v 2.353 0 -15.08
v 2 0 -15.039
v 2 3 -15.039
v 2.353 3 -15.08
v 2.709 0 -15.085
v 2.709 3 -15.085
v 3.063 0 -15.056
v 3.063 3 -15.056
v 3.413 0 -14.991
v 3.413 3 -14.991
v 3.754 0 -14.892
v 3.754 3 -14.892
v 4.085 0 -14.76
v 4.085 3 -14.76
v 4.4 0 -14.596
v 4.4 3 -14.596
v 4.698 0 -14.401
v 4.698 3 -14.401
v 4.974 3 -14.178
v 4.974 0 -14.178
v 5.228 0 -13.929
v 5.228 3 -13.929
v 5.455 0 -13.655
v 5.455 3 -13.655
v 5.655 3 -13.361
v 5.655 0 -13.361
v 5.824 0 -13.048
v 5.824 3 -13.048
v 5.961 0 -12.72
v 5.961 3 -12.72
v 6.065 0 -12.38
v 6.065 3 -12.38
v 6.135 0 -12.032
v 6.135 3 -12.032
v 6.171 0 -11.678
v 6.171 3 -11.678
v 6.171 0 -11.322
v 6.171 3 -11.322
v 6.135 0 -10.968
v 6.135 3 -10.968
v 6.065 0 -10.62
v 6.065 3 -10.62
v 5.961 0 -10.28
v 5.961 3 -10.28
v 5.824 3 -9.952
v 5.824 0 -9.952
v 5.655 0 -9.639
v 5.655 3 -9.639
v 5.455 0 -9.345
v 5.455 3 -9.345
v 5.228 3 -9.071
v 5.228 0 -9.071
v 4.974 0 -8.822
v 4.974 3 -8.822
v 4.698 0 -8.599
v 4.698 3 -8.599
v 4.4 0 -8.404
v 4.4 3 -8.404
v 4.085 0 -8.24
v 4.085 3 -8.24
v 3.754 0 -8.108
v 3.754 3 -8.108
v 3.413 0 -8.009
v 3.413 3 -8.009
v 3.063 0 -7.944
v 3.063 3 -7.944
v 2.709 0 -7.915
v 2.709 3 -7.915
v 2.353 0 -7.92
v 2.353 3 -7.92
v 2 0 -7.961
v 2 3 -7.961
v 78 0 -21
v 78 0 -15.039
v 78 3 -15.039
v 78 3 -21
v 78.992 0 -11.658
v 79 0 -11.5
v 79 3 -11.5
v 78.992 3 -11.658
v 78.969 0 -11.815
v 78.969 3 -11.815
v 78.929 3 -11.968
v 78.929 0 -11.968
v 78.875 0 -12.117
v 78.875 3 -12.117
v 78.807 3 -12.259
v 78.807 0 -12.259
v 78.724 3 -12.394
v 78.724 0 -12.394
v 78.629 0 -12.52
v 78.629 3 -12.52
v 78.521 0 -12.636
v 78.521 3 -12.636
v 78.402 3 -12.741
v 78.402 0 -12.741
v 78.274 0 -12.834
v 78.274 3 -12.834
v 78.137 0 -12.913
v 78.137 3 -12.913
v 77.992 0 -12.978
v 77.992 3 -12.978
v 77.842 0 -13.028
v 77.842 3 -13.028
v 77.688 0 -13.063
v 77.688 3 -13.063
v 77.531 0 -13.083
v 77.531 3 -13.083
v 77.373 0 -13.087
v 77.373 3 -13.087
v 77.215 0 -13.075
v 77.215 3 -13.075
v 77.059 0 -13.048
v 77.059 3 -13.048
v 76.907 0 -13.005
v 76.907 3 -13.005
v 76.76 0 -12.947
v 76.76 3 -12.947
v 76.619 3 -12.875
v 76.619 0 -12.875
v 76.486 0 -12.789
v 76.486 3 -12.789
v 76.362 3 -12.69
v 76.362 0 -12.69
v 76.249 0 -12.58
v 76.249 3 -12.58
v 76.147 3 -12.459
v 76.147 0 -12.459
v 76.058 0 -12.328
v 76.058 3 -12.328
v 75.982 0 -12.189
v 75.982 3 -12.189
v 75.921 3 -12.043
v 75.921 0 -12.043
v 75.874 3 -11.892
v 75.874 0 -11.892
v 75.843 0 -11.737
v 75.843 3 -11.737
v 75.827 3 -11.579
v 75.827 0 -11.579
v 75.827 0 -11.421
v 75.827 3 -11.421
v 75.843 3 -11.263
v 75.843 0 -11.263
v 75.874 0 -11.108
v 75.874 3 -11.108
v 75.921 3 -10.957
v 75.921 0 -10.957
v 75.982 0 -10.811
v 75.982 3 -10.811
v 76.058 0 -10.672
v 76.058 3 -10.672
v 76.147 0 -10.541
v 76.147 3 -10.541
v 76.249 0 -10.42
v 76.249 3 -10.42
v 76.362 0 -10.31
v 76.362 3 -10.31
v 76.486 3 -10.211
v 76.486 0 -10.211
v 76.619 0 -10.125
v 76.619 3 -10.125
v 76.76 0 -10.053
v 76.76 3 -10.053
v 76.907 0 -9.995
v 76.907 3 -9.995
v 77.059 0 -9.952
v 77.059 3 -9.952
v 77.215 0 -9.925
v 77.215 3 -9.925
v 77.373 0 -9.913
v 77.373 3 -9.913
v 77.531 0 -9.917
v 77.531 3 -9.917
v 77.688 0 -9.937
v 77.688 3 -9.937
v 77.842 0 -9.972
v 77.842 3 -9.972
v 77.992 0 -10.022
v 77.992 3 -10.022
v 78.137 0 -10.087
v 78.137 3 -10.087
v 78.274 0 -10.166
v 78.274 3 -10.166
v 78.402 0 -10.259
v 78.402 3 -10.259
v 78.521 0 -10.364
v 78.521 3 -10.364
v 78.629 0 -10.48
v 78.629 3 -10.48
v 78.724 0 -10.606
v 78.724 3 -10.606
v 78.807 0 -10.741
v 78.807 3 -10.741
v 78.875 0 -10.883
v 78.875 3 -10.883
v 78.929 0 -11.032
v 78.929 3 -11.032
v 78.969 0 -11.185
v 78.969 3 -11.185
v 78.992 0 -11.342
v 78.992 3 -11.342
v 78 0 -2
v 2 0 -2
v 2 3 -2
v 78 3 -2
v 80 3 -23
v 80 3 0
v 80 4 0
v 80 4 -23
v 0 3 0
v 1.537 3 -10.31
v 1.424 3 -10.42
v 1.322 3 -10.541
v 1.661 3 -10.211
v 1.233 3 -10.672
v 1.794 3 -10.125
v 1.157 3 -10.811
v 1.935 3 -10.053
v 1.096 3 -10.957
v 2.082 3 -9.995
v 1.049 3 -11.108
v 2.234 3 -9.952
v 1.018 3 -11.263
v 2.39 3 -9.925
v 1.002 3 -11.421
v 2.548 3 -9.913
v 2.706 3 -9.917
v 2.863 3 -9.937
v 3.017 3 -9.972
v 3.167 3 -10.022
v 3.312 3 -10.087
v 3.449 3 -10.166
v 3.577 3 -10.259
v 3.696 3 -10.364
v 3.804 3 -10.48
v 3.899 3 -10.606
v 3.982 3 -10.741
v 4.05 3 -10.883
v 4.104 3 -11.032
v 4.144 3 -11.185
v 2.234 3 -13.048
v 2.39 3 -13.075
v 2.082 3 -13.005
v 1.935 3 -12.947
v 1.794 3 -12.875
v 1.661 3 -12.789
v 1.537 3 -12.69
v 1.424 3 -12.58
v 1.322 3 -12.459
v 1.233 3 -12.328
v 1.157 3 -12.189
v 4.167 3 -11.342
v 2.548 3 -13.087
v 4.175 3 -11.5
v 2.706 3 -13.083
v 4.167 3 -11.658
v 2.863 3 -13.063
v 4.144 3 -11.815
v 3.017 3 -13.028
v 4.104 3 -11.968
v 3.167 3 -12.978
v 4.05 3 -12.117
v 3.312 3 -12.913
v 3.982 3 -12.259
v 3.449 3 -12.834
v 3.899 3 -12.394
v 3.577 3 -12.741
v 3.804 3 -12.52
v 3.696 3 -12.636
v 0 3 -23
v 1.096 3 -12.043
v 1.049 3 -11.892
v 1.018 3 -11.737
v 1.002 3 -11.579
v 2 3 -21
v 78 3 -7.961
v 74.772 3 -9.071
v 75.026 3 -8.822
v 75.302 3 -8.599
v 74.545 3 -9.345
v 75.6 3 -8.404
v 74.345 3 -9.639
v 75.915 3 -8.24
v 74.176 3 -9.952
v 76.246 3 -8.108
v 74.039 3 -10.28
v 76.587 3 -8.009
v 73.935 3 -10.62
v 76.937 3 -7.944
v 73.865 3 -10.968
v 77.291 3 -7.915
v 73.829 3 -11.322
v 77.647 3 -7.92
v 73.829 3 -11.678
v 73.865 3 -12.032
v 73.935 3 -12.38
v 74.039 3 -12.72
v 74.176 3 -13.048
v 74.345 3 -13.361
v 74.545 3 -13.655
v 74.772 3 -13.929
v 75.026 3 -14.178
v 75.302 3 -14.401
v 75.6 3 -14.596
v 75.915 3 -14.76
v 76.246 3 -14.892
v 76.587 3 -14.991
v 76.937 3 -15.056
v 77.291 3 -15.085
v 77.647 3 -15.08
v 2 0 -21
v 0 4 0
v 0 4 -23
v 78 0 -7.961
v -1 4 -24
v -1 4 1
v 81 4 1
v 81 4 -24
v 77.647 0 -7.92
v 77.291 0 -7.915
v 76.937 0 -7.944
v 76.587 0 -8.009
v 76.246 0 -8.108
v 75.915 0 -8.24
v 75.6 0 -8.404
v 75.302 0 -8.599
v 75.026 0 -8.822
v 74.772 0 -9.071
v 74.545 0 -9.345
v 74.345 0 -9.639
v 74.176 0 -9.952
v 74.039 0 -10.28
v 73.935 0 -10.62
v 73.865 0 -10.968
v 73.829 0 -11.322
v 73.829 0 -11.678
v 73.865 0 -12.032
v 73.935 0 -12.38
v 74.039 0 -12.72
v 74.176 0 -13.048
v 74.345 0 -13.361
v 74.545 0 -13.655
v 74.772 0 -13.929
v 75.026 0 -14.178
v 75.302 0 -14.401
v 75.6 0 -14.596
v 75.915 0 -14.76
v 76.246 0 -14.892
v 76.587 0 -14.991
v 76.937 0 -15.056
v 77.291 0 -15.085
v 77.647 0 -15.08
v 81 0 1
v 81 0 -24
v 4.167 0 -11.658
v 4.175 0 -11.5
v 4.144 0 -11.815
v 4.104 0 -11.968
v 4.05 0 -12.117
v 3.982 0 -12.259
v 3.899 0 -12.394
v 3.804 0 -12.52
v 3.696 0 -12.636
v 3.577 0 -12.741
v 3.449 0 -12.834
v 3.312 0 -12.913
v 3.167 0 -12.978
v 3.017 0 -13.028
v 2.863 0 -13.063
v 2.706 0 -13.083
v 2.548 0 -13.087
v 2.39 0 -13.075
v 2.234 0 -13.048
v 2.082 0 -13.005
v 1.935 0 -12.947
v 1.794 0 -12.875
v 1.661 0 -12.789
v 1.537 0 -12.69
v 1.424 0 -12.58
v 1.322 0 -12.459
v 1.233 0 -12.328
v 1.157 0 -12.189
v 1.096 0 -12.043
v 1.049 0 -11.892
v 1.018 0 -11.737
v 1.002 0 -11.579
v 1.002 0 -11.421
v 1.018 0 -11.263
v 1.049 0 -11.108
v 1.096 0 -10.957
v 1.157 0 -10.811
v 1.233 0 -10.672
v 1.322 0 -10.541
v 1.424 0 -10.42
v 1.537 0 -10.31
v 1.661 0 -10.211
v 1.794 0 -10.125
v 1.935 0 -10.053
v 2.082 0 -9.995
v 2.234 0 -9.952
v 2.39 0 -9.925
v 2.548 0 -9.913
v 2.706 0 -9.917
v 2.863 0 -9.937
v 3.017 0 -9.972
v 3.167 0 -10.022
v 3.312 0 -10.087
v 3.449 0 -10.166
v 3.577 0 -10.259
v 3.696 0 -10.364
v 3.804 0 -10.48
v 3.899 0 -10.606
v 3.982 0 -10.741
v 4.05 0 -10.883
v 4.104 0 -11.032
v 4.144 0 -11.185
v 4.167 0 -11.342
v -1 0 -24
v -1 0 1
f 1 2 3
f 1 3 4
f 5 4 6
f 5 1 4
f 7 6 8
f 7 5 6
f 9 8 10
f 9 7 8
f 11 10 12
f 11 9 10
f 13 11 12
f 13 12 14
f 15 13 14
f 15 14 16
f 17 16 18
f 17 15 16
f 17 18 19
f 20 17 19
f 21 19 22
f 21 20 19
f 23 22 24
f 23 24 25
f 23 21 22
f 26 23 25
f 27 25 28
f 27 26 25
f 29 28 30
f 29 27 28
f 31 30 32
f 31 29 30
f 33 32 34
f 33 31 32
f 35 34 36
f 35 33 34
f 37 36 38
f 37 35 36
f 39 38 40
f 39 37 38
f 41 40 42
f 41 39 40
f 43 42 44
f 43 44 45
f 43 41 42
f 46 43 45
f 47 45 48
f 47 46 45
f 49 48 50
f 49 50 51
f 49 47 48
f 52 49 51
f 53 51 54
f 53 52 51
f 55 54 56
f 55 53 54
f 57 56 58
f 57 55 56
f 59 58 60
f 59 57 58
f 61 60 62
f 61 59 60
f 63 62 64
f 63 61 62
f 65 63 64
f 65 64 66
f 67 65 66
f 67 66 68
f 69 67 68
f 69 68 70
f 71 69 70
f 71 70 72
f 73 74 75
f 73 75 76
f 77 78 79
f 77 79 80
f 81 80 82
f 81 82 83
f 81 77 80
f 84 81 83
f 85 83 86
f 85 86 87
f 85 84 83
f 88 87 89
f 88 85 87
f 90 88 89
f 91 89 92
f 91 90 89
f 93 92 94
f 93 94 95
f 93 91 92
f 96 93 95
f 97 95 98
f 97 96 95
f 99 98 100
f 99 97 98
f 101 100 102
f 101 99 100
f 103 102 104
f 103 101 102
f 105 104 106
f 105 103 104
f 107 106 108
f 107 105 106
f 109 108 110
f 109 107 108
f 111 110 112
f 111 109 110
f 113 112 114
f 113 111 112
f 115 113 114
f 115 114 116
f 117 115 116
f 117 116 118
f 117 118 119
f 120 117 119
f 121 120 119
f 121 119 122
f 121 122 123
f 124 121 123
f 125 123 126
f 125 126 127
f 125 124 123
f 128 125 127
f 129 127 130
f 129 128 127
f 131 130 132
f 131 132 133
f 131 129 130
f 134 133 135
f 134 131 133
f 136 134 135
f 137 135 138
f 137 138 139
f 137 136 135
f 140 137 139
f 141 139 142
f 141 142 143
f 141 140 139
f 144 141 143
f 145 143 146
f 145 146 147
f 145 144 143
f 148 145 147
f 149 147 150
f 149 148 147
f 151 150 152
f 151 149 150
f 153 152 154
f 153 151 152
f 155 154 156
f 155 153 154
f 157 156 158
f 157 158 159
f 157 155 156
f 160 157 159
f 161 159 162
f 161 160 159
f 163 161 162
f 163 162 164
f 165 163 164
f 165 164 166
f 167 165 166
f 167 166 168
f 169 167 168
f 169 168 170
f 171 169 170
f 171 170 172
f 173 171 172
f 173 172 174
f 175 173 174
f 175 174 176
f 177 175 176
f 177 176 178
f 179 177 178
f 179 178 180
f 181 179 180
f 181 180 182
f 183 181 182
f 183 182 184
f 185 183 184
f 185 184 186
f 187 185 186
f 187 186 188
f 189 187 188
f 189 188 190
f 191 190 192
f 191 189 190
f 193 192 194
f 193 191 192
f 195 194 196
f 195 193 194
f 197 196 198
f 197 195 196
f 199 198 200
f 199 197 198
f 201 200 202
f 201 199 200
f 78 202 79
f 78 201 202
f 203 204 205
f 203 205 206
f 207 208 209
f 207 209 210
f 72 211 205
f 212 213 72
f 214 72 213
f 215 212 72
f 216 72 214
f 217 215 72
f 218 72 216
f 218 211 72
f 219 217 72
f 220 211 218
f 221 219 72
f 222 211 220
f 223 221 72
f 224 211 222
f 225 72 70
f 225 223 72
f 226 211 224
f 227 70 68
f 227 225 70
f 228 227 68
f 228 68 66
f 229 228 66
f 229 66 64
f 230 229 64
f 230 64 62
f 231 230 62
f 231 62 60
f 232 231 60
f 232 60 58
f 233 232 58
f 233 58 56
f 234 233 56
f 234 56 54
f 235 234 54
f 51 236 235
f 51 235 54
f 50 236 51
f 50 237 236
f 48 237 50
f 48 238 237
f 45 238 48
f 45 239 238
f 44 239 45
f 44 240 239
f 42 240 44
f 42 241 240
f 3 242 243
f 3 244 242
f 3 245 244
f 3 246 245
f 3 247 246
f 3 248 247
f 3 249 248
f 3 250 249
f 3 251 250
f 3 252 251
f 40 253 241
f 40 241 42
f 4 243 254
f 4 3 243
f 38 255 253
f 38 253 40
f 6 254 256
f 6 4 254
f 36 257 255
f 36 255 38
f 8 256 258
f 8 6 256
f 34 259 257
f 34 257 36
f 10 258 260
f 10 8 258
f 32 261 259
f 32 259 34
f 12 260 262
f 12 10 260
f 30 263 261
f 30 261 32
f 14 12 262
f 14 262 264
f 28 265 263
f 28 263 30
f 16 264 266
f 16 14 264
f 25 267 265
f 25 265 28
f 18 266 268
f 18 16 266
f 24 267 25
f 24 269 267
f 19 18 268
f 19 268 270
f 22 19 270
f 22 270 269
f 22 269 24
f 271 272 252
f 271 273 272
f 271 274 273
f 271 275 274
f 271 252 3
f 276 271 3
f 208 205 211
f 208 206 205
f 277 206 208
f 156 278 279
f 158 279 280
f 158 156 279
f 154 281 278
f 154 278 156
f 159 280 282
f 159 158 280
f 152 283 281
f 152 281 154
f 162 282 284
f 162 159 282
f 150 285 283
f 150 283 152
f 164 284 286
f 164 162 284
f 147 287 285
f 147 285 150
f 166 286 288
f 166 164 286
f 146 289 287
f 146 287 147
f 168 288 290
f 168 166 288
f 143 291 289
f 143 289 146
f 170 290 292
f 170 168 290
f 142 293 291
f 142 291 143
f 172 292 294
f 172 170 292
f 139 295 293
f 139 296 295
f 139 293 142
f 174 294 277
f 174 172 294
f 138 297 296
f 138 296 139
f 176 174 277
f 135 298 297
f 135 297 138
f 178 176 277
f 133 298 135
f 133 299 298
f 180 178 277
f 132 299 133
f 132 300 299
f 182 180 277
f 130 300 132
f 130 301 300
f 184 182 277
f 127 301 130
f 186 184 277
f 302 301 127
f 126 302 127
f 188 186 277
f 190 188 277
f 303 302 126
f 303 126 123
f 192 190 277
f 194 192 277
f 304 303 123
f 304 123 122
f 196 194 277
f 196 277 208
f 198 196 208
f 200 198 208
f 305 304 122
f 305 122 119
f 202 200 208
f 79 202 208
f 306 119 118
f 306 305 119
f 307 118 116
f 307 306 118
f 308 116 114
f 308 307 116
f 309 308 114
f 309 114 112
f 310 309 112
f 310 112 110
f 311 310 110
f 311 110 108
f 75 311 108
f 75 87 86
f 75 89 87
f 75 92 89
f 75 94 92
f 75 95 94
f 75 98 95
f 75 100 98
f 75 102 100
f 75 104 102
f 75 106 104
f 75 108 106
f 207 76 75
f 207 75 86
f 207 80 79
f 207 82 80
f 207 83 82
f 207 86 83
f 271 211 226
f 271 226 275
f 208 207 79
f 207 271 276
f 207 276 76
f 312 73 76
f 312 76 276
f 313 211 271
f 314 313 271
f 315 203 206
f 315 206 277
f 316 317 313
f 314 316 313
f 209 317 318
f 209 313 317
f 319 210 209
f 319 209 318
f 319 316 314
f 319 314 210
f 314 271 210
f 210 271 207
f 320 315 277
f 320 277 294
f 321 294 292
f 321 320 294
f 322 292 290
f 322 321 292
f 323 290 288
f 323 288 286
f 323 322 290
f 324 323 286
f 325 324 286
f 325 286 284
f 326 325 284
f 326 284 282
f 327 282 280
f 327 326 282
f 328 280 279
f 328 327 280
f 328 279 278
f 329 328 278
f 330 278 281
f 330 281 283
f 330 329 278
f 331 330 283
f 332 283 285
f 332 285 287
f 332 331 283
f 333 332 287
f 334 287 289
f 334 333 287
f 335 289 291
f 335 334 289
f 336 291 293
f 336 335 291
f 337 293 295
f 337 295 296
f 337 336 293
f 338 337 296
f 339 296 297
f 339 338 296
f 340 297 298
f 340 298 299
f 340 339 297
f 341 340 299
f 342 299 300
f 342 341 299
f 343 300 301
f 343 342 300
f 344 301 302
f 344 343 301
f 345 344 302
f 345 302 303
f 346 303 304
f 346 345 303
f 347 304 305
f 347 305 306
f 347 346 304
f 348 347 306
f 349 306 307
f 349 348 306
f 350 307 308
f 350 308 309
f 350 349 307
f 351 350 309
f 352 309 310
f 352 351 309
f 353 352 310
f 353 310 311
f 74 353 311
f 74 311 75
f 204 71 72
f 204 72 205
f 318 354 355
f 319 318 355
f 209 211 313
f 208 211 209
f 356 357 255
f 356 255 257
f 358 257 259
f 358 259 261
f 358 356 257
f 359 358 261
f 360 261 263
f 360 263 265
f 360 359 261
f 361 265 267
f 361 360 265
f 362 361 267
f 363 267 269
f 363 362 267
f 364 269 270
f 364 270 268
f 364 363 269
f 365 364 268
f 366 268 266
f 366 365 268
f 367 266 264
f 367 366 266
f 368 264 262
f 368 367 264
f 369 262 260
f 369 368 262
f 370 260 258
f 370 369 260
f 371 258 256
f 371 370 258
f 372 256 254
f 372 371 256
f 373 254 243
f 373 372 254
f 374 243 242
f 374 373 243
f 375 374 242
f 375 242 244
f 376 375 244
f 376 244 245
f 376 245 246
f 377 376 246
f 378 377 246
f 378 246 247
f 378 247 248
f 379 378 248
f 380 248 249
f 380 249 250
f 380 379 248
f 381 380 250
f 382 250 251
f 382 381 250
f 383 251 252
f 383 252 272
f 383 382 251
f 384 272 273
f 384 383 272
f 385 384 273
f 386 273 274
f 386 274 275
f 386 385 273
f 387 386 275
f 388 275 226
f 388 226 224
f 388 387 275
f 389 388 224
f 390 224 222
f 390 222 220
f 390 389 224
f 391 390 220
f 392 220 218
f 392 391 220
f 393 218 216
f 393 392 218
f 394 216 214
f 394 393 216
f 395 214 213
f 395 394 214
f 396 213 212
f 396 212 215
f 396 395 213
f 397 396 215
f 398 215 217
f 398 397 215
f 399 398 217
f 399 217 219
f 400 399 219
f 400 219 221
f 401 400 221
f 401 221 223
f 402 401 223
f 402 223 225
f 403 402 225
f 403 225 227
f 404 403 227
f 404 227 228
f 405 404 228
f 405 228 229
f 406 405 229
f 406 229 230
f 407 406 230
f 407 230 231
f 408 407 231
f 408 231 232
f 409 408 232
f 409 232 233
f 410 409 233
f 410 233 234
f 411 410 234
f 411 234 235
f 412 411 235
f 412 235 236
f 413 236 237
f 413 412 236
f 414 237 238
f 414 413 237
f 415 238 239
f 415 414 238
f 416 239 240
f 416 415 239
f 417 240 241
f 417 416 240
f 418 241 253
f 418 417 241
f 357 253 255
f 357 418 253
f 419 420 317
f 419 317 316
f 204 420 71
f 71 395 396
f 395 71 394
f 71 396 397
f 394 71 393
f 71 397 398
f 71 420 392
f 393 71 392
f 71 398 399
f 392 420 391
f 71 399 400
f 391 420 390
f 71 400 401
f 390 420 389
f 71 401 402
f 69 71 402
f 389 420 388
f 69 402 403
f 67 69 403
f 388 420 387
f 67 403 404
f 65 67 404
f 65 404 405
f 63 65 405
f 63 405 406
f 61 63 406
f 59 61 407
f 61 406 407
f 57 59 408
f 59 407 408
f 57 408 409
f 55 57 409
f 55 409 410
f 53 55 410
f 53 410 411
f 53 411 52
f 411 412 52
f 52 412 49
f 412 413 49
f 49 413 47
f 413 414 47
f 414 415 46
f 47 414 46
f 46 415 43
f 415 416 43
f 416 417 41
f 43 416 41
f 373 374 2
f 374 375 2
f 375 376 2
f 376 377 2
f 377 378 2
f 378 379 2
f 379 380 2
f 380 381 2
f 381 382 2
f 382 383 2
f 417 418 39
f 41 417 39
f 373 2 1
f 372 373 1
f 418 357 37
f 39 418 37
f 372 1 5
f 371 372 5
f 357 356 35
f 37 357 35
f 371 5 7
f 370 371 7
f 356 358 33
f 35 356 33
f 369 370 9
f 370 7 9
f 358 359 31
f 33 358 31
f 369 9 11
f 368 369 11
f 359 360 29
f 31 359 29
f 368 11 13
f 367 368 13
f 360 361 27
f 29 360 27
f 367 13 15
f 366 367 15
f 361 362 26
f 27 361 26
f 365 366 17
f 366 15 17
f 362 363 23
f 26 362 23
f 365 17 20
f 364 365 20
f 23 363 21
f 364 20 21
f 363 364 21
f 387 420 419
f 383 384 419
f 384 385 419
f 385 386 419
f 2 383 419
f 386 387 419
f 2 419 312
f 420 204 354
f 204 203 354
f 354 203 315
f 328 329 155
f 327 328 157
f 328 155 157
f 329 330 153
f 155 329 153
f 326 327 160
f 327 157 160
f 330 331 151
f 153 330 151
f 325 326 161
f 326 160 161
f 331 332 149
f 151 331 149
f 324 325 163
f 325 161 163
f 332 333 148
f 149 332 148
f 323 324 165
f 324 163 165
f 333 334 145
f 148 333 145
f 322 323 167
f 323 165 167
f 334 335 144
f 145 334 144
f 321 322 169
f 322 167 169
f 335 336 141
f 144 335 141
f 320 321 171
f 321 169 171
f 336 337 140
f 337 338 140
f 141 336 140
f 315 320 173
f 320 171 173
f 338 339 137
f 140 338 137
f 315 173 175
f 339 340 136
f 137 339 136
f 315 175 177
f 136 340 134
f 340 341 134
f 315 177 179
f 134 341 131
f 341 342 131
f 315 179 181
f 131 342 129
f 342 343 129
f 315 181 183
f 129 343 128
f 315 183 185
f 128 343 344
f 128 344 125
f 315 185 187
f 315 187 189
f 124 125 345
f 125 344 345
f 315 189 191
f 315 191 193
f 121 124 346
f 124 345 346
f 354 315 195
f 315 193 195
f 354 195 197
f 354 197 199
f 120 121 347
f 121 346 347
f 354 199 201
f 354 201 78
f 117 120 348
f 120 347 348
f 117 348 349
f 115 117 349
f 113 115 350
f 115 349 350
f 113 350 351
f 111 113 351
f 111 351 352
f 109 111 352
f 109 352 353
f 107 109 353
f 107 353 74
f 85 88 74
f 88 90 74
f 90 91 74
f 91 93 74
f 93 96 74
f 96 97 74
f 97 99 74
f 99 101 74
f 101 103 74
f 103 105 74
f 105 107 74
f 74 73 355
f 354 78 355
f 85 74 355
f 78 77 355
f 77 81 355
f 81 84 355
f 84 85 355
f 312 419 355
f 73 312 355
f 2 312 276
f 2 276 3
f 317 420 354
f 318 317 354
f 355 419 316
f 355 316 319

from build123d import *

# Parameters (mm, degrees)
SKETCH1_W           = 80
SKETCH1_H           = 23
SKETCH1_R           = 1.5875
BOSS_EXTRUDE1_DEPTH = 3
SKETCH1_3_W         = 82
SKETCH1_3_H         = 25
SKETCH1_3_W_2       = 80
SKETCH1_3_H_2       = 23
BOSS_EXTRUDE2_DEPTH = 4


with BuildPart() as part:
    # Sketch1 → Boss-Extrude1 (new body)
    with BuildSketch(Plane(origin=(0, 0, 0), x_dir=(1, 0, 0), z_dir=(0, 1, 0))):
        with Locations((40, 11.5)):
            Rectangle(SKETCH1_W, SKETCH1_H)
        with Locations((2.5875, 11.5)):
            Circle(SKETCH1_R, mode=Mode.SUBTRACT)
        with BuildLine():
            Line((2, 15.039067674), (2, 21))
            Line((2, 21), (78, 21))
            Line((78, 21), (78, 15.039067674))
            ThreePointArc((78, 15.039067674), (73.825, 11.5), (78, 7.960932326))
            Line((78, 7.960932326), (78, 2))
            Line((78, 2), (2, 2))
            Line((2, 2), (2, 7.960932326))
            ThreePointArc((2, 7.960932326), (6.175, 11.5), (2, 15.039067674))
        make_face(mode=Mode.SUBTRACT)
        with Locations((77.4125, 11.5)):
            Circle(SKETCH1_R, mode=Mode.SUBTRACT)
    extrude(amount=BOSS_EXTRUDE1_DEPTH)

    # Sketch1<3> → Boss-Extrude2 (add)
    with BuildSketch(Plane(origin=(0, 0, 0), x_dir=(1, 0, 0), z_dir=(0, 1, 0))):
        with Locations((40, 11.5)):
            Rectangle(SKETCH1_3_W, SKETCH1_3_H)
        with Locations((40, 11.5)):
            Rectangle(SKETCH1_3_W_2, SKETCH1_3_H_2, mode=Mode.SUBTRACT)
    extrude(amount=BOSS_EXTRUDE2_DEPTH)


solid = part.part
